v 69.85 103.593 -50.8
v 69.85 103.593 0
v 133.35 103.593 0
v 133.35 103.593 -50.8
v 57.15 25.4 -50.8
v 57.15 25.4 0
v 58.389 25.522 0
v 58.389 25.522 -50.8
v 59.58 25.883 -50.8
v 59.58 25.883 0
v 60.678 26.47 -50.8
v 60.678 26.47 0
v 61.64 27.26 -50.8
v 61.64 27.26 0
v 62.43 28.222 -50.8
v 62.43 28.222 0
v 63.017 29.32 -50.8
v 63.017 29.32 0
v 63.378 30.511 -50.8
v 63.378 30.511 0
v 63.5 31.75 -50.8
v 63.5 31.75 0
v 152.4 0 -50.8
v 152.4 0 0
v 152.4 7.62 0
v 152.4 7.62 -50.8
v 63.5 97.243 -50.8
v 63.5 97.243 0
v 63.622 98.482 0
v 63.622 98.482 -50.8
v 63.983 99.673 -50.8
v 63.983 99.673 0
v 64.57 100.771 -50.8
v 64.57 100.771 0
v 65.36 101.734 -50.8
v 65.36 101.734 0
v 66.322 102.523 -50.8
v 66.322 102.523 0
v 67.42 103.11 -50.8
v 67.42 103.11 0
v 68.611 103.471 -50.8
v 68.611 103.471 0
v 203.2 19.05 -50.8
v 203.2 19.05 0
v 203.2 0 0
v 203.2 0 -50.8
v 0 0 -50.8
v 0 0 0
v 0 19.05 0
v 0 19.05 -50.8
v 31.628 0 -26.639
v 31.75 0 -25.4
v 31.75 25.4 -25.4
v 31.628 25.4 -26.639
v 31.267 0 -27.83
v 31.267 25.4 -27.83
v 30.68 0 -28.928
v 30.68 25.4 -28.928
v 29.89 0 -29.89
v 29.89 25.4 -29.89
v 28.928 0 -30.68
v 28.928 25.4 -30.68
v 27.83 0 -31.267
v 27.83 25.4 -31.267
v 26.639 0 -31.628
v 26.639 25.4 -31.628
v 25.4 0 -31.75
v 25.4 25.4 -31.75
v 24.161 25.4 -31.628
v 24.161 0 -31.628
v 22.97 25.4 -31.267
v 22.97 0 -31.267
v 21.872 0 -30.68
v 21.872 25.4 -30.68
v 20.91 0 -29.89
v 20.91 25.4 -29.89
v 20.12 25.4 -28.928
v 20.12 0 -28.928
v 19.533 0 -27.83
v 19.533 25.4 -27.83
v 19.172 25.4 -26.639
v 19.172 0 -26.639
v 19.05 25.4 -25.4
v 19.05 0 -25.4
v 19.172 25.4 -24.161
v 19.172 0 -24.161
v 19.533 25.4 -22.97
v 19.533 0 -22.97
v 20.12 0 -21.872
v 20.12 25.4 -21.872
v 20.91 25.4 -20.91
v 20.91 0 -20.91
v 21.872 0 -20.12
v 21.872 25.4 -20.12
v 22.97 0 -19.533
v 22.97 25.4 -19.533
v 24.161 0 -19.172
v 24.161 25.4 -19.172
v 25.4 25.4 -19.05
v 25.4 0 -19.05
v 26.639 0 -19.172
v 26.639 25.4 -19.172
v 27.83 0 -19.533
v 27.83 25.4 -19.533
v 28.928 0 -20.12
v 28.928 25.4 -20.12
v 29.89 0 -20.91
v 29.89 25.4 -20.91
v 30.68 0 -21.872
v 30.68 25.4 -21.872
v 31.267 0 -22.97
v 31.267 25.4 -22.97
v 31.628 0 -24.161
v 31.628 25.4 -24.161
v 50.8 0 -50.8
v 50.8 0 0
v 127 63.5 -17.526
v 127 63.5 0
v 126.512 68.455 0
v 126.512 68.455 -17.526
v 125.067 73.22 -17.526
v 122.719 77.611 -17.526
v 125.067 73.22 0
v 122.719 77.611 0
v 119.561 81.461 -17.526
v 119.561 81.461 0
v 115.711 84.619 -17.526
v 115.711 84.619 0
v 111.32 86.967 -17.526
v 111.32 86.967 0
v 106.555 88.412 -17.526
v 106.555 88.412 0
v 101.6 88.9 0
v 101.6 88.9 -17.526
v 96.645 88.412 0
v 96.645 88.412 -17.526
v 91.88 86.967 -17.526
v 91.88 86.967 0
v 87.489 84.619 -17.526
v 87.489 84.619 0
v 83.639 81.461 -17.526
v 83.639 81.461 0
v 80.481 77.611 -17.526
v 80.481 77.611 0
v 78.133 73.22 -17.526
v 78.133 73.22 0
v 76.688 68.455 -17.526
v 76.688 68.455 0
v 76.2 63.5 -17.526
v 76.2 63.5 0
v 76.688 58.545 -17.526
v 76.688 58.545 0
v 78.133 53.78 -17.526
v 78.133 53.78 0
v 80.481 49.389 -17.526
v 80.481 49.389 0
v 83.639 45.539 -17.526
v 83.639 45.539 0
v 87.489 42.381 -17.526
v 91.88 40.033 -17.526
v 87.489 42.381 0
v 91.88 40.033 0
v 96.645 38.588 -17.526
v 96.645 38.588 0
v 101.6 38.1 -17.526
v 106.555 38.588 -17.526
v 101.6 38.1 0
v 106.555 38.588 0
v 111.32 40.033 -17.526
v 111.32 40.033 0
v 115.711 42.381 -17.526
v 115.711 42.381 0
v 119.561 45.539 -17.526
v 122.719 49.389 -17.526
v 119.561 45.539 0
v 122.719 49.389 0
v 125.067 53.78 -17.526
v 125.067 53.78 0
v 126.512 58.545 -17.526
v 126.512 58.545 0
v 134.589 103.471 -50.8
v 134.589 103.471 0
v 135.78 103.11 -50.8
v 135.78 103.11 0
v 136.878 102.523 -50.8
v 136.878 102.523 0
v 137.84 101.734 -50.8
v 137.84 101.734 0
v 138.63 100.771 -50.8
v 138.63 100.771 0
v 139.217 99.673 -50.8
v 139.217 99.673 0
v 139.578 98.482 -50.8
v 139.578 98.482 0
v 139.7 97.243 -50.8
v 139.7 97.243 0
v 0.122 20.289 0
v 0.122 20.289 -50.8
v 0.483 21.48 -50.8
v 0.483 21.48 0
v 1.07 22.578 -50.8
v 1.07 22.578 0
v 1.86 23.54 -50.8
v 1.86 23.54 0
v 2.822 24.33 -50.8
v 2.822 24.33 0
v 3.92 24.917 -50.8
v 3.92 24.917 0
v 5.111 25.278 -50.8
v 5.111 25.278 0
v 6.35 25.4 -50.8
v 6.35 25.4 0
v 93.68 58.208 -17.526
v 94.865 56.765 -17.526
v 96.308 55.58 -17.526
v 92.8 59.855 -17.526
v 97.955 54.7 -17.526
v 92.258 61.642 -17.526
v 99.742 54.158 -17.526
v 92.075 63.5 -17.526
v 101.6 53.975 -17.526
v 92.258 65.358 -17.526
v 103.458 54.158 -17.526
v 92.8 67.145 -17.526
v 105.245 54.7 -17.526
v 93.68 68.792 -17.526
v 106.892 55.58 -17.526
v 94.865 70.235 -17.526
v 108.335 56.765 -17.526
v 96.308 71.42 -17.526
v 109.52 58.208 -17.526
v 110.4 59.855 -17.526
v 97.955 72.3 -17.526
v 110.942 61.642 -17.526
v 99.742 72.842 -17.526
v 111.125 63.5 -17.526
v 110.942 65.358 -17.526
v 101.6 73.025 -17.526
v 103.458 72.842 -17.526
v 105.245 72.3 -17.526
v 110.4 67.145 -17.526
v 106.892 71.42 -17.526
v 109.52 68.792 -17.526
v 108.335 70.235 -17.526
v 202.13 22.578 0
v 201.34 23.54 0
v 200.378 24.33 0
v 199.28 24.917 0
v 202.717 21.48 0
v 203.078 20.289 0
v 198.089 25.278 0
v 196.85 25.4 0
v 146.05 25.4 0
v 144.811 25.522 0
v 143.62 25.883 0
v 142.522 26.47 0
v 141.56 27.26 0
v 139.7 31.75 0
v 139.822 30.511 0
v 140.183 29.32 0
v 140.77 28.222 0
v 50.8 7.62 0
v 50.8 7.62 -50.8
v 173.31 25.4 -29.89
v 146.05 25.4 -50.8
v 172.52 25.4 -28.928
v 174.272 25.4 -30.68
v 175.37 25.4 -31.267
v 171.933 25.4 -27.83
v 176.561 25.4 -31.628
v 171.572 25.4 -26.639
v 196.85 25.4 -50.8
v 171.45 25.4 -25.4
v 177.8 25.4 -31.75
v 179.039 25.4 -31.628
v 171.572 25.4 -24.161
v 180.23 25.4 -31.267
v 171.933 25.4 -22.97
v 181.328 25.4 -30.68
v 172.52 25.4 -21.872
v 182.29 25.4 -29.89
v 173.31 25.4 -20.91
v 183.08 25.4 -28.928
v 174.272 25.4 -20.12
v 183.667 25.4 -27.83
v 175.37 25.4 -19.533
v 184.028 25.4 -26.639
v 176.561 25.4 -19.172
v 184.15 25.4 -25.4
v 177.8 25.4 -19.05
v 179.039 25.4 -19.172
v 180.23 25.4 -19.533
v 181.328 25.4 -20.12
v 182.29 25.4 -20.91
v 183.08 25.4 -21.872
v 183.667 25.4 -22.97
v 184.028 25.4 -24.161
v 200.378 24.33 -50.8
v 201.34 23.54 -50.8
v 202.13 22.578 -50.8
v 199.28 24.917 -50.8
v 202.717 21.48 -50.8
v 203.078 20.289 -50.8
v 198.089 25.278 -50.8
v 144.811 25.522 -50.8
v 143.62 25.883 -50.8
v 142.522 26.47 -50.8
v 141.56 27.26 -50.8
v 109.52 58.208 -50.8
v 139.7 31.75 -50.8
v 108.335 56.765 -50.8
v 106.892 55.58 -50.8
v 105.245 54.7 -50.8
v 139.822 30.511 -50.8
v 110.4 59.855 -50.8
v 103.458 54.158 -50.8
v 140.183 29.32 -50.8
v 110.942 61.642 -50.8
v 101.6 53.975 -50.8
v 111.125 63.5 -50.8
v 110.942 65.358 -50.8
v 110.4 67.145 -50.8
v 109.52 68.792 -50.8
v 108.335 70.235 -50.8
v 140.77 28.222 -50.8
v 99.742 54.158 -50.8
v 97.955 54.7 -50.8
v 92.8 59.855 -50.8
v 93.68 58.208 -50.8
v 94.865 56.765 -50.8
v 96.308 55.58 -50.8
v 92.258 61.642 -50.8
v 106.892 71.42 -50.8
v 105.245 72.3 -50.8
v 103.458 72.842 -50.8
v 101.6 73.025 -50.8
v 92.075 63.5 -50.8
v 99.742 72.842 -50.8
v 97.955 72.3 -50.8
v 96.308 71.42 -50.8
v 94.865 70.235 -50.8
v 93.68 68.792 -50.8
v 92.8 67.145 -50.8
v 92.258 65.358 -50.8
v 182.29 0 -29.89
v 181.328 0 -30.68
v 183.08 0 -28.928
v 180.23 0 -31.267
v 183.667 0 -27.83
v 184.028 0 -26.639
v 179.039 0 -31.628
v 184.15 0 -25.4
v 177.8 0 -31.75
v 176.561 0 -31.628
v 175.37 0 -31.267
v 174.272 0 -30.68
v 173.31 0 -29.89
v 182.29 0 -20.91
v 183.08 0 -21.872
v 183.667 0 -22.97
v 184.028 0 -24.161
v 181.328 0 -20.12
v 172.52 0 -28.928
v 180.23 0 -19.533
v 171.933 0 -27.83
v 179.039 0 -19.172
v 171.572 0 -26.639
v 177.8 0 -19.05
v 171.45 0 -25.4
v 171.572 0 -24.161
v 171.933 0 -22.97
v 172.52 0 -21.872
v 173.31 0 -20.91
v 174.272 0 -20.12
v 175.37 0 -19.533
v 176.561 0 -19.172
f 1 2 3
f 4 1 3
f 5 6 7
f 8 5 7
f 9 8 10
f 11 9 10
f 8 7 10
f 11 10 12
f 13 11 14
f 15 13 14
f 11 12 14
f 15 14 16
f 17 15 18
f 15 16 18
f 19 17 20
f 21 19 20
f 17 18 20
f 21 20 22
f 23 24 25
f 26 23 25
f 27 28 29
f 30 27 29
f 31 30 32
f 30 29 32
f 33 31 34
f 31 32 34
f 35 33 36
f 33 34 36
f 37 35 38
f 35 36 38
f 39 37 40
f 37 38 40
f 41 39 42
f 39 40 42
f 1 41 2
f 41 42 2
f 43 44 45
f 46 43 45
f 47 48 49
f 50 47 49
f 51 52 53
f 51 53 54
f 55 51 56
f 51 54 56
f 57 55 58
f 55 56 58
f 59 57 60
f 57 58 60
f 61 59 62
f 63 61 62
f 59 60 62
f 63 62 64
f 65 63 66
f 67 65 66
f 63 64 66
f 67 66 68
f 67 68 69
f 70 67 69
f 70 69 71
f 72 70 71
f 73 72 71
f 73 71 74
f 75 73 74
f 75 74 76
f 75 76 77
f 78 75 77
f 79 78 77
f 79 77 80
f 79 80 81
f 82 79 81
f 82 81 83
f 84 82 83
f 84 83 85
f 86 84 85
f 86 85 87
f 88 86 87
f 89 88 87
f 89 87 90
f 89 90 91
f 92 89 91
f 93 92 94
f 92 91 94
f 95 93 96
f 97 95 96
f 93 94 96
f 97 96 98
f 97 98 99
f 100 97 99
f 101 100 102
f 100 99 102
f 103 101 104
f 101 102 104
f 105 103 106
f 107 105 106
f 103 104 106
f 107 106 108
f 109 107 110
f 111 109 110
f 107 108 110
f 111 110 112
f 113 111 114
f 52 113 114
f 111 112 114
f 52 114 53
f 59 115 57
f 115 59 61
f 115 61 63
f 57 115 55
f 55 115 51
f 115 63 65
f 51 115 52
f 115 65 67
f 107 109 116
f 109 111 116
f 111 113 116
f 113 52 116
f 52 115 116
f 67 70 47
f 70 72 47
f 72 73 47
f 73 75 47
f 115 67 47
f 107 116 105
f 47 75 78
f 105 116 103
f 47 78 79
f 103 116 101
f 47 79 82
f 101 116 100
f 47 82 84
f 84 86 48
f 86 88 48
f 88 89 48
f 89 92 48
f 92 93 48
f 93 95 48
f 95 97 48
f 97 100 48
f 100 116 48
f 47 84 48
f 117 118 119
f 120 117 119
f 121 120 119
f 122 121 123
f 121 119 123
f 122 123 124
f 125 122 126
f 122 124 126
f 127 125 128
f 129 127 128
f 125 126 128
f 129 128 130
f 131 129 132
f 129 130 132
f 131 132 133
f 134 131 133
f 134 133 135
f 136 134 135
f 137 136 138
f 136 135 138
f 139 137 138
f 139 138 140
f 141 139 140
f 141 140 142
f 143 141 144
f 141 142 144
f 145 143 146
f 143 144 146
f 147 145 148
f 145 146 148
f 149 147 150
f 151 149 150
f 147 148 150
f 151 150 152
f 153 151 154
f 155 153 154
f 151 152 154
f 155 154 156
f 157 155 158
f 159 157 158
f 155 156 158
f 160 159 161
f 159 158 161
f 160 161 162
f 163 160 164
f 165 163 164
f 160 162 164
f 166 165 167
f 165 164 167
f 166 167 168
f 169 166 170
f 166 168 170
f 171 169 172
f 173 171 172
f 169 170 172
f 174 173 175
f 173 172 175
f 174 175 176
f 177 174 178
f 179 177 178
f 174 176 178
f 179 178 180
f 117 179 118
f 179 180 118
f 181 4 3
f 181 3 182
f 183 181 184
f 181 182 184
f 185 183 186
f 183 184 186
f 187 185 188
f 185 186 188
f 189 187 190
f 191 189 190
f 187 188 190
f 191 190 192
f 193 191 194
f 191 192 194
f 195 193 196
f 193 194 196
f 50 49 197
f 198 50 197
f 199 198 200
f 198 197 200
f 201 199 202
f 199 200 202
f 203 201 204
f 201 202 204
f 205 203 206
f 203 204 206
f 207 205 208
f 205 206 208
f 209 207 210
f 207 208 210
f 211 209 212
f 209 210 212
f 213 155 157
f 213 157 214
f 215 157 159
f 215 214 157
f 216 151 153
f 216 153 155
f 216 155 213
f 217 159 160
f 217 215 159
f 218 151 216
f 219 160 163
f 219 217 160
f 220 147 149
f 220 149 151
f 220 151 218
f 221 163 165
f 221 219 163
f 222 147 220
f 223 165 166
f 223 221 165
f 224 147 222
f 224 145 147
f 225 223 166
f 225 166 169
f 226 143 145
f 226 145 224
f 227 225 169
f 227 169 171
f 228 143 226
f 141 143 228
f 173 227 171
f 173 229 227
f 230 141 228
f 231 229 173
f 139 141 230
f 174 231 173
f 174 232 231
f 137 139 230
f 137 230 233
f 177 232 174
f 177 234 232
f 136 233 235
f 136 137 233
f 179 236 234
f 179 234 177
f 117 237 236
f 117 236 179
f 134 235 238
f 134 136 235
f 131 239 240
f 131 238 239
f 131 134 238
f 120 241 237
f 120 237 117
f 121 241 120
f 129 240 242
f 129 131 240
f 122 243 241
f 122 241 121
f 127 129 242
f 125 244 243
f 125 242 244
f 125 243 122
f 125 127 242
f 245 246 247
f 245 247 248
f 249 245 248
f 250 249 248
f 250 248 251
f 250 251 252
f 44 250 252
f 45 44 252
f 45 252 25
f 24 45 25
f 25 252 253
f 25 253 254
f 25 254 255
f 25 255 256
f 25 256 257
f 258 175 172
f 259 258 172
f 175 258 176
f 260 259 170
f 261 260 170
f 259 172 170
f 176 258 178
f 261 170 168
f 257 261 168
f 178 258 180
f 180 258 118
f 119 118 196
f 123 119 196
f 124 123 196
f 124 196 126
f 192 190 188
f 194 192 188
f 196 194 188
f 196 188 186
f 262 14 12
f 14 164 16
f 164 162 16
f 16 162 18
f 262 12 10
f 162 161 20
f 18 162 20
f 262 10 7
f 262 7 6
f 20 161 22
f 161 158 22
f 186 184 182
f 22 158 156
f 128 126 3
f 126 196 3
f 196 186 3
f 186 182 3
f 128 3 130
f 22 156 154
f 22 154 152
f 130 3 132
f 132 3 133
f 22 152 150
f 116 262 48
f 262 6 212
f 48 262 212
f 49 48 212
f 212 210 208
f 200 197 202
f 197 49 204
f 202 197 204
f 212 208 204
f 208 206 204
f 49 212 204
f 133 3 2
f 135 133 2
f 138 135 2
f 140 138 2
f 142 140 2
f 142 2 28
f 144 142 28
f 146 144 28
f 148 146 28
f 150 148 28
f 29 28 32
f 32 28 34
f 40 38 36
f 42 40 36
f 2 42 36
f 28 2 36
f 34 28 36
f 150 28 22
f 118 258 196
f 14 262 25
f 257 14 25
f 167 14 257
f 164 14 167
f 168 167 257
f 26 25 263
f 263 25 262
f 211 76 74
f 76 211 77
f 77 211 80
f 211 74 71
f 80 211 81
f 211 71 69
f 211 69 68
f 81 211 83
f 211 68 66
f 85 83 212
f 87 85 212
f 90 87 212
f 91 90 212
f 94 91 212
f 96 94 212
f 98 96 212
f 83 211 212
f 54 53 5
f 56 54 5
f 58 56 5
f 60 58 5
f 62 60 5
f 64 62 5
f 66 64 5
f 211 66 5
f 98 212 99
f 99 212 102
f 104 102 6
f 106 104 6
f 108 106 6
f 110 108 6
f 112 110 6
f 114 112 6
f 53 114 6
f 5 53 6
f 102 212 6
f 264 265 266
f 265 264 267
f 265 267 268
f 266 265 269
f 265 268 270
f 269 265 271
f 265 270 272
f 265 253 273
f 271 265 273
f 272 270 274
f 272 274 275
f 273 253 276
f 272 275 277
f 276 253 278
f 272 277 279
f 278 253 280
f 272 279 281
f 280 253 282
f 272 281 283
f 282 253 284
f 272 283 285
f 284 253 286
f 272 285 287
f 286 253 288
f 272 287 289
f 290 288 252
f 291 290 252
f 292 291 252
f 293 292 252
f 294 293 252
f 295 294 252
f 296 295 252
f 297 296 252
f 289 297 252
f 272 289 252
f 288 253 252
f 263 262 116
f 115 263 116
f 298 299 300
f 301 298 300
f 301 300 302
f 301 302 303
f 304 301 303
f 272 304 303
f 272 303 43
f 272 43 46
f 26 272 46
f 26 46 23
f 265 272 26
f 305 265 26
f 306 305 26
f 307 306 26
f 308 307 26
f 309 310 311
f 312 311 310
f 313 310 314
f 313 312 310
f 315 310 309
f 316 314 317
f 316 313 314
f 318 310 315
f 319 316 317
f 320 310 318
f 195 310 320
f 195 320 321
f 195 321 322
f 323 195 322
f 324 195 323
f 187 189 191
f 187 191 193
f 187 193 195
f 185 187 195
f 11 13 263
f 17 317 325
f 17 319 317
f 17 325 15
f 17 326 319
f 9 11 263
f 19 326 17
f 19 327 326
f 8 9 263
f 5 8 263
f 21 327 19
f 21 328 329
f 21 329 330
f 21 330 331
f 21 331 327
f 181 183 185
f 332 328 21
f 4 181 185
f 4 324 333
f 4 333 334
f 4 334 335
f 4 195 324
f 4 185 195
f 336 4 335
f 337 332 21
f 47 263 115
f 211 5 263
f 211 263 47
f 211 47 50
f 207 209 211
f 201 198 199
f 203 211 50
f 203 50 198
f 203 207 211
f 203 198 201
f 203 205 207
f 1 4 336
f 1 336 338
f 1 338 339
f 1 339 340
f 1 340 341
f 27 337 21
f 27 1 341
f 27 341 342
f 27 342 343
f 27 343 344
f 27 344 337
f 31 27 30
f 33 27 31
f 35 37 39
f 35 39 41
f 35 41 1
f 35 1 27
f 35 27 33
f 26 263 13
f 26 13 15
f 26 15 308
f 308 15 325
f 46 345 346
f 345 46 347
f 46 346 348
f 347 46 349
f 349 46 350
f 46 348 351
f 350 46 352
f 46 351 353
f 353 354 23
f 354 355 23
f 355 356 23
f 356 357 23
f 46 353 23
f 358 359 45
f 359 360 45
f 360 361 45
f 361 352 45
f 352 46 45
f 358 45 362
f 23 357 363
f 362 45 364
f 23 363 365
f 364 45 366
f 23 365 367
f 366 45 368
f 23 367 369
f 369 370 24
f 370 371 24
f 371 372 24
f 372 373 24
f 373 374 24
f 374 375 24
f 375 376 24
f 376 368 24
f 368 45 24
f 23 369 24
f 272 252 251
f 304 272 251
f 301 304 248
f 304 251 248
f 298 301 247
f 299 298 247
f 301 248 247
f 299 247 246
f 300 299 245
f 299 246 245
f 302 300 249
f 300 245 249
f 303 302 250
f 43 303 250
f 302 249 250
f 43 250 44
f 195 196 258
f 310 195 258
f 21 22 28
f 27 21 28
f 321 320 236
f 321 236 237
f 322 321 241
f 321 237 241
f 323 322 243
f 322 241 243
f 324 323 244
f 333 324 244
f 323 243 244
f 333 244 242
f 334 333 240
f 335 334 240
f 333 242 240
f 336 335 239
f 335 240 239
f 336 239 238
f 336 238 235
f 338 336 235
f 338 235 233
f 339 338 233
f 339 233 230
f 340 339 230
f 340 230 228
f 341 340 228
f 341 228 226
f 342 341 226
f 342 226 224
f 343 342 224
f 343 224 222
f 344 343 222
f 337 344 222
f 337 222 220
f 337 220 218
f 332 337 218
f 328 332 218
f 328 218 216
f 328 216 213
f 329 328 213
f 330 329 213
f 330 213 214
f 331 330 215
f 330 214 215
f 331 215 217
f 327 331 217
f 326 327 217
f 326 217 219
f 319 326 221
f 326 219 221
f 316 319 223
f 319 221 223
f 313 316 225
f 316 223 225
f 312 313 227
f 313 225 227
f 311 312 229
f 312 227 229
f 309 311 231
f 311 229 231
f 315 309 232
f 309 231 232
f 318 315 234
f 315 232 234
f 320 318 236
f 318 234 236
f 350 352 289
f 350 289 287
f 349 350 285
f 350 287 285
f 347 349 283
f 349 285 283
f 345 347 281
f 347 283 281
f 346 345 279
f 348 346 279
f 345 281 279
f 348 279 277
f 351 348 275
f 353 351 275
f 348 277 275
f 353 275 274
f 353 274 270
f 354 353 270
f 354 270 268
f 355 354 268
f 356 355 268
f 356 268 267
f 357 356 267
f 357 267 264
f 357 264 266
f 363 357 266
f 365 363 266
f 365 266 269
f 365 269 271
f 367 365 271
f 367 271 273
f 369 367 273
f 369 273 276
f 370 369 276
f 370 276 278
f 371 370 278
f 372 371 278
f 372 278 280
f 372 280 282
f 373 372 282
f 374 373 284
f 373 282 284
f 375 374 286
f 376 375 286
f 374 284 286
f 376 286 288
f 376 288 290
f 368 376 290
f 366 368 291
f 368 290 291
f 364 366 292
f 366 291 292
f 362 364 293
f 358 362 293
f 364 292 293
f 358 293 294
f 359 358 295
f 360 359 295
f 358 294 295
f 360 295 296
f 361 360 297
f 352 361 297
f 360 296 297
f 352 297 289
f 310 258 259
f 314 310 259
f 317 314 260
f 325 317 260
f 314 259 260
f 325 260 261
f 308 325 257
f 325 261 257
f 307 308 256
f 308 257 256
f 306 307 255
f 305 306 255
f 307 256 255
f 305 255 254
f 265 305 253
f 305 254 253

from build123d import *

# Parameters (mm, degrees)
BOSS_EXTRUDE1_DEPTH = 50.8
SKETCH6_R           = 9.525
CUT_EXTRUDE1_DEPTH  = 50.8
SKETCH7_R           = 25.4
CUT_EXTRUDE2_DEPTH  = 17.526
SKETCH8_R           = 6.35
CUT_EXTRUDE3_DEPTH  = 26.4
SKETCH9_R           = 6.35
CUT_EXTRUDE4_DEPTH  = 26.4


with BuildPart() as part:
    # Sketch5 → Boss-Extrude1 (new body)
    with BuildSketch(Plane.XY):
        with BuildLine():
            Line((6.35, 25.4), (57.15, 25.4))
            ThreePointArc((57.15, 25.4), (61.640128061, 27.259871939), (63.5, 31.75))
            Line((63.5, 31.75), (63.5, 97.24338288))
            ThreePointArc((63.5, 97.24338288), (65.359871939, 101.73351094), (69.85, 103.59338288))
            Line((69.85, 103.59338288), (133.35, 103.59338288))
            ThreePointArc((133.35, 103.59338288), (137.840128061, 101.73351094), (139.7, 97.24338288))
            Line((139.7, 97.24338288), (139.7, 31.75))
            ThreePointArc((139.7, 31.75), (141.559871939, 27.259871939), (146.05, 25.4))
            Line((146.05, 25.4), (196.85, 25.4))
            ThreePointArc((196.85, 25.4), (201.340128061, 23.540128061), (203.2, 19.05))
            Line((203.2, 19.05), (203.2, 0))
            Line((203.2, 0), (152.4, 0))
            Line((152.4, 0), (152.4, 7.62))
            Line((152.4, 7.62), (50.8, 7.62))
            Line((50.8, 7.62), (50.8, 0))
            Line((50.8, 0), (0, 0))
            Line((0, 0), (0, 19.05))
            ThreePointArc((0, 19.05), (1.859871939, 23.540128061), (6.35, 25.4))
        make_face()
    extrude(amount=-BOSS_EXTRUDE1_DEPTH)

    # Sketch6 → Cut-Extrude1 (cut)
    with BuildSketch(Plane.XY):
        with Locations((101.6, 63.5)):
            Circle(SKETCH6_R)
    extrude(amount=-CUT_EXTRUDE1_DEPTH, mode=Mode.SUBTRACT)

    # Sketch7 → Cut-Extrude2 (cut)
    with BuildSketch(Plane.XY):
        with Locations((101.6, 63.5)):
            Circle(SKETCH7_R)
    extrude(amount=-CUT_EXTRUDE2_DEPTH, mode=Mode.SUBTRACT)

    # Sketch8 → Cut-Extrude3 (cut, through all)
    with BuildSketch(Plane(origin=(0, 25.4, 0), x_dir=(1, 0, 0), z_dir=(0, 1, 0))):
        with Locations((25.4, 25.4)):
            Circle(SKETCH8_R)
    extrude(amount=-CUT_EXTRUDE3_DEPTH, mode=Mode.SUBTRACT)

    # Sketch9 → Cut-Extrude4 (cut, through all)
    with BuildSketch(Plane(origin=(0, 25.4, 0), x_dir=(1, 0, 0), z_dir=(0, 1, 0))):
        with Locations((177.8, 25.4)):
            Circle(SKETCH9_R)
    extrude(amount=-CUT_EXTRUDE4_DEPTH, mode=Mode.SUBTRACT)


solid = part.part
